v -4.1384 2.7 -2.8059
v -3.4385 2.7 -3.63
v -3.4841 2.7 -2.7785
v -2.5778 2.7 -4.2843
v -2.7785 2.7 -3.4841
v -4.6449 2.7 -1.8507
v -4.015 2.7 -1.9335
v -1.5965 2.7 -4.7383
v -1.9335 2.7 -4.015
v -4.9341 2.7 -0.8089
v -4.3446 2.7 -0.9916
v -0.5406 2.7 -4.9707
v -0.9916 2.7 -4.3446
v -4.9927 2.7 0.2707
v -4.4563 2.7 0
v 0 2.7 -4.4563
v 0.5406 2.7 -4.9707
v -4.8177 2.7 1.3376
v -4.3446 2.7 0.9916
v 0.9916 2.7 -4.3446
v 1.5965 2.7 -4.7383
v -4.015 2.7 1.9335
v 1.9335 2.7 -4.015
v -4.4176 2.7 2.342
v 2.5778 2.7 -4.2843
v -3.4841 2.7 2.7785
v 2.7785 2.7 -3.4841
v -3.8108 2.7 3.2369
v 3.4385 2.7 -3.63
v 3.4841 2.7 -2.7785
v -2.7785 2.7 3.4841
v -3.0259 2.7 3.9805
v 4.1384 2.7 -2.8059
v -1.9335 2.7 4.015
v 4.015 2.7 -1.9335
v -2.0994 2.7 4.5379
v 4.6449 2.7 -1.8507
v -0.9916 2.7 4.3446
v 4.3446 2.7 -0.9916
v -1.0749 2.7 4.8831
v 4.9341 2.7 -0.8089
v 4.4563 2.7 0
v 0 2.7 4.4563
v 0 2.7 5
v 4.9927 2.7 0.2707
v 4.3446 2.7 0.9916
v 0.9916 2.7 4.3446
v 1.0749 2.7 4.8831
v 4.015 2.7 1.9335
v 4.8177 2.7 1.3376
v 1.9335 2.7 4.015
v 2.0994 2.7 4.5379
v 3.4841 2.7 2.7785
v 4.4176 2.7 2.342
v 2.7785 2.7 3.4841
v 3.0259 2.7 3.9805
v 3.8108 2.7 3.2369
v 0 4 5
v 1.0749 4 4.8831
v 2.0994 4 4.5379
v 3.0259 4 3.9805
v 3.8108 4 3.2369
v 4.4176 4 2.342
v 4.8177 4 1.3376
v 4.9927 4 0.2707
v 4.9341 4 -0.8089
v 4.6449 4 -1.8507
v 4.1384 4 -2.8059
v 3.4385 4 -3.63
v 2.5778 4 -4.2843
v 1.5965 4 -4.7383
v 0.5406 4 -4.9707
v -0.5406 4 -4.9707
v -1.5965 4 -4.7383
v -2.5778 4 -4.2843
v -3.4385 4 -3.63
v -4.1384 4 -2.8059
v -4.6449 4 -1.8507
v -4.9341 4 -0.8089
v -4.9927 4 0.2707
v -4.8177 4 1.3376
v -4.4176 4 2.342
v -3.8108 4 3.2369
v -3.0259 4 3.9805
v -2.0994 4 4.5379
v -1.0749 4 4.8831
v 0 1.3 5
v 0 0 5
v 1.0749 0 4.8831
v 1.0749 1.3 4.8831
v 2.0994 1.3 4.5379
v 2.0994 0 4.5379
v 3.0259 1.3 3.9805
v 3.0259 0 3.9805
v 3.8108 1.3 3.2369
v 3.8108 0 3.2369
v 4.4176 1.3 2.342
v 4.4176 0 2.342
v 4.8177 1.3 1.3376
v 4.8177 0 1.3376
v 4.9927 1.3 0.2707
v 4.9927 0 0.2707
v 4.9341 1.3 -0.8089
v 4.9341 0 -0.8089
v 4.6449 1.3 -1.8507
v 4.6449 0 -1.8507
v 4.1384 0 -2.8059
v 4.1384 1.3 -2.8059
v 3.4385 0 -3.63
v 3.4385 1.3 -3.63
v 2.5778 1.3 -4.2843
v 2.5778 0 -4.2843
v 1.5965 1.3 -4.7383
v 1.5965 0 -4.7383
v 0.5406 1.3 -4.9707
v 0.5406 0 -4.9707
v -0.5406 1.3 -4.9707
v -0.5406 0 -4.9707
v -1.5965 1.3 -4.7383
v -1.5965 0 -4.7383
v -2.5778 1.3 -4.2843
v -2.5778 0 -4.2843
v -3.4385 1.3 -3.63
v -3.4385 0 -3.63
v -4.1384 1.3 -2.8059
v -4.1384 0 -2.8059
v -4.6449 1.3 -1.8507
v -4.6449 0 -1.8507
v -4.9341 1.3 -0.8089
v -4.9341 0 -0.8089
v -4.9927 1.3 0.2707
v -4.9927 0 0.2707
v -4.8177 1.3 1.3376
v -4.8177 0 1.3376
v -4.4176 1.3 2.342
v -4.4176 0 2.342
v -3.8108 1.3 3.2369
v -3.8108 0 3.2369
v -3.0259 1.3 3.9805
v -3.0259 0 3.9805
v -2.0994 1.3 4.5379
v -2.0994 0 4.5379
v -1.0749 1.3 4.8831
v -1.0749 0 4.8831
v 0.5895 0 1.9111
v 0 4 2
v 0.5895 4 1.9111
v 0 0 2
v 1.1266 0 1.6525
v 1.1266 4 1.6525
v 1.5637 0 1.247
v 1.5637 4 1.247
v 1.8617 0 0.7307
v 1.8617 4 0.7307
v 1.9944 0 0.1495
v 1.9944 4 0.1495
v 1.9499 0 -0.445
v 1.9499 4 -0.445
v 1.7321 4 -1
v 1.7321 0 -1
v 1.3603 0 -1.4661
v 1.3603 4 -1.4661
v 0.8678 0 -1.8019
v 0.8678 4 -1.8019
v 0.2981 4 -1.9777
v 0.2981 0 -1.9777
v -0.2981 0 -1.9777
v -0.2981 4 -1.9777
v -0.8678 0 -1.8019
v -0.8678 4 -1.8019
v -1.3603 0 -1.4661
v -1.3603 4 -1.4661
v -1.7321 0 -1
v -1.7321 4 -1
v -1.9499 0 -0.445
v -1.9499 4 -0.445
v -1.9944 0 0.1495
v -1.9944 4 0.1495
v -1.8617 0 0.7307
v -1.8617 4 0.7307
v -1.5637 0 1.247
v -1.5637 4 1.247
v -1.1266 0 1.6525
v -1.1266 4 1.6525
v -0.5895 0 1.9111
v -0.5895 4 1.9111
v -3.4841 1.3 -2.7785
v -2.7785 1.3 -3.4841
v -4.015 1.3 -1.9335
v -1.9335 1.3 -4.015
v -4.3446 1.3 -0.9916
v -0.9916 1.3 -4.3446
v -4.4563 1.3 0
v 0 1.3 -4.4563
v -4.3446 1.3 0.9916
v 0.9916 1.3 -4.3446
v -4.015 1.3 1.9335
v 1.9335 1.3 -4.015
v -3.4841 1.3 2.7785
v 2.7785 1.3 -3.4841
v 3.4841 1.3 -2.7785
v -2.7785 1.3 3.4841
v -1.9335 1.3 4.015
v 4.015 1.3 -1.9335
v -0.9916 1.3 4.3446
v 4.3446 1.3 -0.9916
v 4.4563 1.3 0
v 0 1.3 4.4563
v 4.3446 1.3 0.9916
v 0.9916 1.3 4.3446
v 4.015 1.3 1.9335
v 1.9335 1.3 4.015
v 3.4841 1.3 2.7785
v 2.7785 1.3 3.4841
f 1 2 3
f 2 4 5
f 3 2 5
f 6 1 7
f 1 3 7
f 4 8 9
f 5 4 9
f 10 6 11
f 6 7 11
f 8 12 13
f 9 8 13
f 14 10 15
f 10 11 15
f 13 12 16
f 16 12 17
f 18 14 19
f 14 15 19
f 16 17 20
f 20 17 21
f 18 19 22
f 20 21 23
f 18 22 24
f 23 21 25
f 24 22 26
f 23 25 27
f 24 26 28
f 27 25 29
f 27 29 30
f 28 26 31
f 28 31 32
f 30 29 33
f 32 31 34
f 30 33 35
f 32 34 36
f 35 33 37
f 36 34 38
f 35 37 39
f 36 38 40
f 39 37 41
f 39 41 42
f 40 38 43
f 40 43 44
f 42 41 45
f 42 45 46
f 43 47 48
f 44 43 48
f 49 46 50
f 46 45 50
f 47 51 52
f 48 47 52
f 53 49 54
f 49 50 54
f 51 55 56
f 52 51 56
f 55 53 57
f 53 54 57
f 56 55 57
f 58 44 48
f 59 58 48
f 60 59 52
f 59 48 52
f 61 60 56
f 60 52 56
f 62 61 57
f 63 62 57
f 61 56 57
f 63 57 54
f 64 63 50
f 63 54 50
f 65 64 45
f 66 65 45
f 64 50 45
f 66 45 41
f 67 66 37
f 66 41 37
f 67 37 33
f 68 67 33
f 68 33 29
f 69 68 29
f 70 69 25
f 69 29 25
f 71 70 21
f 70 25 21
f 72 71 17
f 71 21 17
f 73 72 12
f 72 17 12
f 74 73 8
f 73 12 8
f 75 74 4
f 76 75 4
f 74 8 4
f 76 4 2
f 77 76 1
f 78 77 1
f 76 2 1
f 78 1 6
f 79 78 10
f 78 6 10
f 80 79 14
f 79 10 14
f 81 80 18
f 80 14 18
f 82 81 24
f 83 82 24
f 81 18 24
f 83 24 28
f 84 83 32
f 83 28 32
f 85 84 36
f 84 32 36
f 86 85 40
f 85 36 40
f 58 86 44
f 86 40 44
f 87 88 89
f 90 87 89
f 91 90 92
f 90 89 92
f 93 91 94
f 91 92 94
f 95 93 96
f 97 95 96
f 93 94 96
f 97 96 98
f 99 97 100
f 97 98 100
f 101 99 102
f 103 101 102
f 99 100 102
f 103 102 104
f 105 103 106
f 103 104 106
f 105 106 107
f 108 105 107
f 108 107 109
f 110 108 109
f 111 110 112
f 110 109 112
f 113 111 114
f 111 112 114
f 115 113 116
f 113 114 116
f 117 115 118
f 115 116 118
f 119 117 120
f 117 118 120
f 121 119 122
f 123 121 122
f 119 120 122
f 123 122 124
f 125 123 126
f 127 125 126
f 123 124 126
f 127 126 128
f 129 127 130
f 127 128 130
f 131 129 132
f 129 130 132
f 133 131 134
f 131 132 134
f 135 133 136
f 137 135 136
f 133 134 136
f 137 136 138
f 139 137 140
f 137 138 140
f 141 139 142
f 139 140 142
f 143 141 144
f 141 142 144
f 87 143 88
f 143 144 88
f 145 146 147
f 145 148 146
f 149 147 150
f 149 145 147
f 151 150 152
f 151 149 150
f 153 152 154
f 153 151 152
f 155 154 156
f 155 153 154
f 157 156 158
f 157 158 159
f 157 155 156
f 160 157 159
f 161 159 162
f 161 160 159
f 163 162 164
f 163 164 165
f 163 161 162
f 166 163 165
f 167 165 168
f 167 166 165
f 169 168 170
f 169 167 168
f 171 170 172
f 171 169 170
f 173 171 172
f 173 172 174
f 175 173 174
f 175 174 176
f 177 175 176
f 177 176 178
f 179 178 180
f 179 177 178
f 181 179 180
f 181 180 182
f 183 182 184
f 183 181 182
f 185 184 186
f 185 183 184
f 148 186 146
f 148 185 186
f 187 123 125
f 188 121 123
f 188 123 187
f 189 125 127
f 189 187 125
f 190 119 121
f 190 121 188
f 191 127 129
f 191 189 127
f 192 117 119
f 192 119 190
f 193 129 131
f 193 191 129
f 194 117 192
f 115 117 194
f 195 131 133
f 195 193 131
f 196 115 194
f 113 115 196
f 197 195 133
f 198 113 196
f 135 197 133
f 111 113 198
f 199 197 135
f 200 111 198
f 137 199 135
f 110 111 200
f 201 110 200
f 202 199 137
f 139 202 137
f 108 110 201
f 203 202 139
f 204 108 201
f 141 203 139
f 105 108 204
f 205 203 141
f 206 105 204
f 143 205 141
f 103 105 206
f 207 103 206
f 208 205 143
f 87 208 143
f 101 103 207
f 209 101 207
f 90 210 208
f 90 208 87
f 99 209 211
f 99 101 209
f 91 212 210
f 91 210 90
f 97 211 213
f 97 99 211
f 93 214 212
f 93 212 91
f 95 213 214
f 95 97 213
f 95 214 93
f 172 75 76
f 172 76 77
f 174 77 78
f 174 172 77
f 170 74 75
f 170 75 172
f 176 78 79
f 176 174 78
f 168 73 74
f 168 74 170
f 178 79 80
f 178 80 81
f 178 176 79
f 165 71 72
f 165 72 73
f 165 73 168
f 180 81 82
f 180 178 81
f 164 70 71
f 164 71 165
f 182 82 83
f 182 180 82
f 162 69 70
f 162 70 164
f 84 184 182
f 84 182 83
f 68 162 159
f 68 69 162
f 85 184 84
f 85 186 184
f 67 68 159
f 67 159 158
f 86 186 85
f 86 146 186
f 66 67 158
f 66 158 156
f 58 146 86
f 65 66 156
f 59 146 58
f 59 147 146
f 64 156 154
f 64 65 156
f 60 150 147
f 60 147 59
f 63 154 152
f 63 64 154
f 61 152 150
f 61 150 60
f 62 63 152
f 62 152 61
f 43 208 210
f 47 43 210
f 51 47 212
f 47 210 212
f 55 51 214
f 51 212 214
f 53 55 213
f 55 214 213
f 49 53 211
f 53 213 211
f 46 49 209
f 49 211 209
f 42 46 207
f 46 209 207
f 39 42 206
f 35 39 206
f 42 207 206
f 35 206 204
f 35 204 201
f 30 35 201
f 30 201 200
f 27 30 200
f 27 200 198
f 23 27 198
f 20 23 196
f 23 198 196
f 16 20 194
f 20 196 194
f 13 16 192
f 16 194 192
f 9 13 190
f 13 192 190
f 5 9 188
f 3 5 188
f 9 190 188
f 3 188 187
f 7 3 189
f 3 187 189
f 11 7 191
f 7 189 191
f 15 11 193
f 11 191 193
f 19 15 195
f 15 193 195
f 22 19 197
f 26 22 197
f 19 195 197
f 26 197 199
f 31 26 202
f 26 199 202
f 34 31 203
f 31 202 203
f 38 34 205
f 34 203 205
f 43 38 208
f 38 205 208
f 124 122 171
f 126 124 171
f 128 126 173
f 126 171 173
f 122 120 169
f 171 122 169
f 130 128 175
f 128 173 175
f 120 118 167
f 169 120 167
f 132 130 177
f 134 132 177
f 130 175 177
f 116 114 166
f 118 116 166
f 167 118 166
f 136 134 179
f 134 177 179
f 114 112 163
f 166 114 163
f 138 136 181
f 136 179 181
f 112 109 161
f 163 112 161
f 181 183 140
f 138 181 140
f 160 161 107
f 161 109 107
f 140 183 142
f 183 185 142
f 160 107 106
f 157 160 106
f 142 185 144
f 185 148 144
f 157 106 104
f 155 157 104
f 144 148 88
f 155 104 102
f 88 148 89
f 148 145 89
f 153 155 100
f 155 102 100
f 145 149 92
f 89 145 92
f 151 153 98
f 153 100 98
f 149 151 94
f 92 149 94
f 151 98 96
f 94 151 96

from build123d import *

# Parameters (mm, degrees)
SKETCH1_R           = 5
SKETCH1_R_2         = 2
BOSS_EXTRUDE1_DEPTH = 1.3
SKETCH2_R           = 4.456309589
SKETCH2_R_2         = 2
BOSS_EXTRUDE2_DEPTH = 1.4
LPATTERN2_COUNT     = 2
LPATTERN2_PITCH     = 2.7


with BuildPart() as part:
    # Sketch1 → Boss-Extrude1 (new body)
    with BuildSketch(Plane(origin=(0, 0, 0), x_dir=(1, 0, 0), z_dir=(0, 1, 0))):
        with Locations(Location((0, 0, 0), (0, 0, 270))):
            Circle(SKETCH1_R)
        with Locations(Location((0, 0, 0), (0, 0, 270))):
            Circle(SKETCH1_R_2, mode=Mode.SUBTRACT)
    boss_extrude1 = extrude(amount=BOSS_EXTRUDE1_DEPTH)

    # Sketch2 → Boss-Extrude2 (add)
    with BuildSketch(Plane(origin=(0, 1.3, 0), x_dir=(1, 0, 0), z_dir=(0, 1, 0))):
        with Locations(Location((0, 0, 0), (0, 0, 270))):
            Circle(SKETCH2_R)
        with Locations(Location((0, 0, 0), (0, 0, 270))):
            Circle(SKETCH2_R_2, mode=Mode.SUBTRACT)
    extrude(amount=BOSS_EXTRUDE2_DEPTH)

    # LPattern2: Boss-Extrude1 ×2
    with Locations(*[(0, i * LPATTERN2_PITCH, 0) for i in range(1, LPATTERN2_COUNT)]):
        add(boss_extrude1)


solid = part.part
